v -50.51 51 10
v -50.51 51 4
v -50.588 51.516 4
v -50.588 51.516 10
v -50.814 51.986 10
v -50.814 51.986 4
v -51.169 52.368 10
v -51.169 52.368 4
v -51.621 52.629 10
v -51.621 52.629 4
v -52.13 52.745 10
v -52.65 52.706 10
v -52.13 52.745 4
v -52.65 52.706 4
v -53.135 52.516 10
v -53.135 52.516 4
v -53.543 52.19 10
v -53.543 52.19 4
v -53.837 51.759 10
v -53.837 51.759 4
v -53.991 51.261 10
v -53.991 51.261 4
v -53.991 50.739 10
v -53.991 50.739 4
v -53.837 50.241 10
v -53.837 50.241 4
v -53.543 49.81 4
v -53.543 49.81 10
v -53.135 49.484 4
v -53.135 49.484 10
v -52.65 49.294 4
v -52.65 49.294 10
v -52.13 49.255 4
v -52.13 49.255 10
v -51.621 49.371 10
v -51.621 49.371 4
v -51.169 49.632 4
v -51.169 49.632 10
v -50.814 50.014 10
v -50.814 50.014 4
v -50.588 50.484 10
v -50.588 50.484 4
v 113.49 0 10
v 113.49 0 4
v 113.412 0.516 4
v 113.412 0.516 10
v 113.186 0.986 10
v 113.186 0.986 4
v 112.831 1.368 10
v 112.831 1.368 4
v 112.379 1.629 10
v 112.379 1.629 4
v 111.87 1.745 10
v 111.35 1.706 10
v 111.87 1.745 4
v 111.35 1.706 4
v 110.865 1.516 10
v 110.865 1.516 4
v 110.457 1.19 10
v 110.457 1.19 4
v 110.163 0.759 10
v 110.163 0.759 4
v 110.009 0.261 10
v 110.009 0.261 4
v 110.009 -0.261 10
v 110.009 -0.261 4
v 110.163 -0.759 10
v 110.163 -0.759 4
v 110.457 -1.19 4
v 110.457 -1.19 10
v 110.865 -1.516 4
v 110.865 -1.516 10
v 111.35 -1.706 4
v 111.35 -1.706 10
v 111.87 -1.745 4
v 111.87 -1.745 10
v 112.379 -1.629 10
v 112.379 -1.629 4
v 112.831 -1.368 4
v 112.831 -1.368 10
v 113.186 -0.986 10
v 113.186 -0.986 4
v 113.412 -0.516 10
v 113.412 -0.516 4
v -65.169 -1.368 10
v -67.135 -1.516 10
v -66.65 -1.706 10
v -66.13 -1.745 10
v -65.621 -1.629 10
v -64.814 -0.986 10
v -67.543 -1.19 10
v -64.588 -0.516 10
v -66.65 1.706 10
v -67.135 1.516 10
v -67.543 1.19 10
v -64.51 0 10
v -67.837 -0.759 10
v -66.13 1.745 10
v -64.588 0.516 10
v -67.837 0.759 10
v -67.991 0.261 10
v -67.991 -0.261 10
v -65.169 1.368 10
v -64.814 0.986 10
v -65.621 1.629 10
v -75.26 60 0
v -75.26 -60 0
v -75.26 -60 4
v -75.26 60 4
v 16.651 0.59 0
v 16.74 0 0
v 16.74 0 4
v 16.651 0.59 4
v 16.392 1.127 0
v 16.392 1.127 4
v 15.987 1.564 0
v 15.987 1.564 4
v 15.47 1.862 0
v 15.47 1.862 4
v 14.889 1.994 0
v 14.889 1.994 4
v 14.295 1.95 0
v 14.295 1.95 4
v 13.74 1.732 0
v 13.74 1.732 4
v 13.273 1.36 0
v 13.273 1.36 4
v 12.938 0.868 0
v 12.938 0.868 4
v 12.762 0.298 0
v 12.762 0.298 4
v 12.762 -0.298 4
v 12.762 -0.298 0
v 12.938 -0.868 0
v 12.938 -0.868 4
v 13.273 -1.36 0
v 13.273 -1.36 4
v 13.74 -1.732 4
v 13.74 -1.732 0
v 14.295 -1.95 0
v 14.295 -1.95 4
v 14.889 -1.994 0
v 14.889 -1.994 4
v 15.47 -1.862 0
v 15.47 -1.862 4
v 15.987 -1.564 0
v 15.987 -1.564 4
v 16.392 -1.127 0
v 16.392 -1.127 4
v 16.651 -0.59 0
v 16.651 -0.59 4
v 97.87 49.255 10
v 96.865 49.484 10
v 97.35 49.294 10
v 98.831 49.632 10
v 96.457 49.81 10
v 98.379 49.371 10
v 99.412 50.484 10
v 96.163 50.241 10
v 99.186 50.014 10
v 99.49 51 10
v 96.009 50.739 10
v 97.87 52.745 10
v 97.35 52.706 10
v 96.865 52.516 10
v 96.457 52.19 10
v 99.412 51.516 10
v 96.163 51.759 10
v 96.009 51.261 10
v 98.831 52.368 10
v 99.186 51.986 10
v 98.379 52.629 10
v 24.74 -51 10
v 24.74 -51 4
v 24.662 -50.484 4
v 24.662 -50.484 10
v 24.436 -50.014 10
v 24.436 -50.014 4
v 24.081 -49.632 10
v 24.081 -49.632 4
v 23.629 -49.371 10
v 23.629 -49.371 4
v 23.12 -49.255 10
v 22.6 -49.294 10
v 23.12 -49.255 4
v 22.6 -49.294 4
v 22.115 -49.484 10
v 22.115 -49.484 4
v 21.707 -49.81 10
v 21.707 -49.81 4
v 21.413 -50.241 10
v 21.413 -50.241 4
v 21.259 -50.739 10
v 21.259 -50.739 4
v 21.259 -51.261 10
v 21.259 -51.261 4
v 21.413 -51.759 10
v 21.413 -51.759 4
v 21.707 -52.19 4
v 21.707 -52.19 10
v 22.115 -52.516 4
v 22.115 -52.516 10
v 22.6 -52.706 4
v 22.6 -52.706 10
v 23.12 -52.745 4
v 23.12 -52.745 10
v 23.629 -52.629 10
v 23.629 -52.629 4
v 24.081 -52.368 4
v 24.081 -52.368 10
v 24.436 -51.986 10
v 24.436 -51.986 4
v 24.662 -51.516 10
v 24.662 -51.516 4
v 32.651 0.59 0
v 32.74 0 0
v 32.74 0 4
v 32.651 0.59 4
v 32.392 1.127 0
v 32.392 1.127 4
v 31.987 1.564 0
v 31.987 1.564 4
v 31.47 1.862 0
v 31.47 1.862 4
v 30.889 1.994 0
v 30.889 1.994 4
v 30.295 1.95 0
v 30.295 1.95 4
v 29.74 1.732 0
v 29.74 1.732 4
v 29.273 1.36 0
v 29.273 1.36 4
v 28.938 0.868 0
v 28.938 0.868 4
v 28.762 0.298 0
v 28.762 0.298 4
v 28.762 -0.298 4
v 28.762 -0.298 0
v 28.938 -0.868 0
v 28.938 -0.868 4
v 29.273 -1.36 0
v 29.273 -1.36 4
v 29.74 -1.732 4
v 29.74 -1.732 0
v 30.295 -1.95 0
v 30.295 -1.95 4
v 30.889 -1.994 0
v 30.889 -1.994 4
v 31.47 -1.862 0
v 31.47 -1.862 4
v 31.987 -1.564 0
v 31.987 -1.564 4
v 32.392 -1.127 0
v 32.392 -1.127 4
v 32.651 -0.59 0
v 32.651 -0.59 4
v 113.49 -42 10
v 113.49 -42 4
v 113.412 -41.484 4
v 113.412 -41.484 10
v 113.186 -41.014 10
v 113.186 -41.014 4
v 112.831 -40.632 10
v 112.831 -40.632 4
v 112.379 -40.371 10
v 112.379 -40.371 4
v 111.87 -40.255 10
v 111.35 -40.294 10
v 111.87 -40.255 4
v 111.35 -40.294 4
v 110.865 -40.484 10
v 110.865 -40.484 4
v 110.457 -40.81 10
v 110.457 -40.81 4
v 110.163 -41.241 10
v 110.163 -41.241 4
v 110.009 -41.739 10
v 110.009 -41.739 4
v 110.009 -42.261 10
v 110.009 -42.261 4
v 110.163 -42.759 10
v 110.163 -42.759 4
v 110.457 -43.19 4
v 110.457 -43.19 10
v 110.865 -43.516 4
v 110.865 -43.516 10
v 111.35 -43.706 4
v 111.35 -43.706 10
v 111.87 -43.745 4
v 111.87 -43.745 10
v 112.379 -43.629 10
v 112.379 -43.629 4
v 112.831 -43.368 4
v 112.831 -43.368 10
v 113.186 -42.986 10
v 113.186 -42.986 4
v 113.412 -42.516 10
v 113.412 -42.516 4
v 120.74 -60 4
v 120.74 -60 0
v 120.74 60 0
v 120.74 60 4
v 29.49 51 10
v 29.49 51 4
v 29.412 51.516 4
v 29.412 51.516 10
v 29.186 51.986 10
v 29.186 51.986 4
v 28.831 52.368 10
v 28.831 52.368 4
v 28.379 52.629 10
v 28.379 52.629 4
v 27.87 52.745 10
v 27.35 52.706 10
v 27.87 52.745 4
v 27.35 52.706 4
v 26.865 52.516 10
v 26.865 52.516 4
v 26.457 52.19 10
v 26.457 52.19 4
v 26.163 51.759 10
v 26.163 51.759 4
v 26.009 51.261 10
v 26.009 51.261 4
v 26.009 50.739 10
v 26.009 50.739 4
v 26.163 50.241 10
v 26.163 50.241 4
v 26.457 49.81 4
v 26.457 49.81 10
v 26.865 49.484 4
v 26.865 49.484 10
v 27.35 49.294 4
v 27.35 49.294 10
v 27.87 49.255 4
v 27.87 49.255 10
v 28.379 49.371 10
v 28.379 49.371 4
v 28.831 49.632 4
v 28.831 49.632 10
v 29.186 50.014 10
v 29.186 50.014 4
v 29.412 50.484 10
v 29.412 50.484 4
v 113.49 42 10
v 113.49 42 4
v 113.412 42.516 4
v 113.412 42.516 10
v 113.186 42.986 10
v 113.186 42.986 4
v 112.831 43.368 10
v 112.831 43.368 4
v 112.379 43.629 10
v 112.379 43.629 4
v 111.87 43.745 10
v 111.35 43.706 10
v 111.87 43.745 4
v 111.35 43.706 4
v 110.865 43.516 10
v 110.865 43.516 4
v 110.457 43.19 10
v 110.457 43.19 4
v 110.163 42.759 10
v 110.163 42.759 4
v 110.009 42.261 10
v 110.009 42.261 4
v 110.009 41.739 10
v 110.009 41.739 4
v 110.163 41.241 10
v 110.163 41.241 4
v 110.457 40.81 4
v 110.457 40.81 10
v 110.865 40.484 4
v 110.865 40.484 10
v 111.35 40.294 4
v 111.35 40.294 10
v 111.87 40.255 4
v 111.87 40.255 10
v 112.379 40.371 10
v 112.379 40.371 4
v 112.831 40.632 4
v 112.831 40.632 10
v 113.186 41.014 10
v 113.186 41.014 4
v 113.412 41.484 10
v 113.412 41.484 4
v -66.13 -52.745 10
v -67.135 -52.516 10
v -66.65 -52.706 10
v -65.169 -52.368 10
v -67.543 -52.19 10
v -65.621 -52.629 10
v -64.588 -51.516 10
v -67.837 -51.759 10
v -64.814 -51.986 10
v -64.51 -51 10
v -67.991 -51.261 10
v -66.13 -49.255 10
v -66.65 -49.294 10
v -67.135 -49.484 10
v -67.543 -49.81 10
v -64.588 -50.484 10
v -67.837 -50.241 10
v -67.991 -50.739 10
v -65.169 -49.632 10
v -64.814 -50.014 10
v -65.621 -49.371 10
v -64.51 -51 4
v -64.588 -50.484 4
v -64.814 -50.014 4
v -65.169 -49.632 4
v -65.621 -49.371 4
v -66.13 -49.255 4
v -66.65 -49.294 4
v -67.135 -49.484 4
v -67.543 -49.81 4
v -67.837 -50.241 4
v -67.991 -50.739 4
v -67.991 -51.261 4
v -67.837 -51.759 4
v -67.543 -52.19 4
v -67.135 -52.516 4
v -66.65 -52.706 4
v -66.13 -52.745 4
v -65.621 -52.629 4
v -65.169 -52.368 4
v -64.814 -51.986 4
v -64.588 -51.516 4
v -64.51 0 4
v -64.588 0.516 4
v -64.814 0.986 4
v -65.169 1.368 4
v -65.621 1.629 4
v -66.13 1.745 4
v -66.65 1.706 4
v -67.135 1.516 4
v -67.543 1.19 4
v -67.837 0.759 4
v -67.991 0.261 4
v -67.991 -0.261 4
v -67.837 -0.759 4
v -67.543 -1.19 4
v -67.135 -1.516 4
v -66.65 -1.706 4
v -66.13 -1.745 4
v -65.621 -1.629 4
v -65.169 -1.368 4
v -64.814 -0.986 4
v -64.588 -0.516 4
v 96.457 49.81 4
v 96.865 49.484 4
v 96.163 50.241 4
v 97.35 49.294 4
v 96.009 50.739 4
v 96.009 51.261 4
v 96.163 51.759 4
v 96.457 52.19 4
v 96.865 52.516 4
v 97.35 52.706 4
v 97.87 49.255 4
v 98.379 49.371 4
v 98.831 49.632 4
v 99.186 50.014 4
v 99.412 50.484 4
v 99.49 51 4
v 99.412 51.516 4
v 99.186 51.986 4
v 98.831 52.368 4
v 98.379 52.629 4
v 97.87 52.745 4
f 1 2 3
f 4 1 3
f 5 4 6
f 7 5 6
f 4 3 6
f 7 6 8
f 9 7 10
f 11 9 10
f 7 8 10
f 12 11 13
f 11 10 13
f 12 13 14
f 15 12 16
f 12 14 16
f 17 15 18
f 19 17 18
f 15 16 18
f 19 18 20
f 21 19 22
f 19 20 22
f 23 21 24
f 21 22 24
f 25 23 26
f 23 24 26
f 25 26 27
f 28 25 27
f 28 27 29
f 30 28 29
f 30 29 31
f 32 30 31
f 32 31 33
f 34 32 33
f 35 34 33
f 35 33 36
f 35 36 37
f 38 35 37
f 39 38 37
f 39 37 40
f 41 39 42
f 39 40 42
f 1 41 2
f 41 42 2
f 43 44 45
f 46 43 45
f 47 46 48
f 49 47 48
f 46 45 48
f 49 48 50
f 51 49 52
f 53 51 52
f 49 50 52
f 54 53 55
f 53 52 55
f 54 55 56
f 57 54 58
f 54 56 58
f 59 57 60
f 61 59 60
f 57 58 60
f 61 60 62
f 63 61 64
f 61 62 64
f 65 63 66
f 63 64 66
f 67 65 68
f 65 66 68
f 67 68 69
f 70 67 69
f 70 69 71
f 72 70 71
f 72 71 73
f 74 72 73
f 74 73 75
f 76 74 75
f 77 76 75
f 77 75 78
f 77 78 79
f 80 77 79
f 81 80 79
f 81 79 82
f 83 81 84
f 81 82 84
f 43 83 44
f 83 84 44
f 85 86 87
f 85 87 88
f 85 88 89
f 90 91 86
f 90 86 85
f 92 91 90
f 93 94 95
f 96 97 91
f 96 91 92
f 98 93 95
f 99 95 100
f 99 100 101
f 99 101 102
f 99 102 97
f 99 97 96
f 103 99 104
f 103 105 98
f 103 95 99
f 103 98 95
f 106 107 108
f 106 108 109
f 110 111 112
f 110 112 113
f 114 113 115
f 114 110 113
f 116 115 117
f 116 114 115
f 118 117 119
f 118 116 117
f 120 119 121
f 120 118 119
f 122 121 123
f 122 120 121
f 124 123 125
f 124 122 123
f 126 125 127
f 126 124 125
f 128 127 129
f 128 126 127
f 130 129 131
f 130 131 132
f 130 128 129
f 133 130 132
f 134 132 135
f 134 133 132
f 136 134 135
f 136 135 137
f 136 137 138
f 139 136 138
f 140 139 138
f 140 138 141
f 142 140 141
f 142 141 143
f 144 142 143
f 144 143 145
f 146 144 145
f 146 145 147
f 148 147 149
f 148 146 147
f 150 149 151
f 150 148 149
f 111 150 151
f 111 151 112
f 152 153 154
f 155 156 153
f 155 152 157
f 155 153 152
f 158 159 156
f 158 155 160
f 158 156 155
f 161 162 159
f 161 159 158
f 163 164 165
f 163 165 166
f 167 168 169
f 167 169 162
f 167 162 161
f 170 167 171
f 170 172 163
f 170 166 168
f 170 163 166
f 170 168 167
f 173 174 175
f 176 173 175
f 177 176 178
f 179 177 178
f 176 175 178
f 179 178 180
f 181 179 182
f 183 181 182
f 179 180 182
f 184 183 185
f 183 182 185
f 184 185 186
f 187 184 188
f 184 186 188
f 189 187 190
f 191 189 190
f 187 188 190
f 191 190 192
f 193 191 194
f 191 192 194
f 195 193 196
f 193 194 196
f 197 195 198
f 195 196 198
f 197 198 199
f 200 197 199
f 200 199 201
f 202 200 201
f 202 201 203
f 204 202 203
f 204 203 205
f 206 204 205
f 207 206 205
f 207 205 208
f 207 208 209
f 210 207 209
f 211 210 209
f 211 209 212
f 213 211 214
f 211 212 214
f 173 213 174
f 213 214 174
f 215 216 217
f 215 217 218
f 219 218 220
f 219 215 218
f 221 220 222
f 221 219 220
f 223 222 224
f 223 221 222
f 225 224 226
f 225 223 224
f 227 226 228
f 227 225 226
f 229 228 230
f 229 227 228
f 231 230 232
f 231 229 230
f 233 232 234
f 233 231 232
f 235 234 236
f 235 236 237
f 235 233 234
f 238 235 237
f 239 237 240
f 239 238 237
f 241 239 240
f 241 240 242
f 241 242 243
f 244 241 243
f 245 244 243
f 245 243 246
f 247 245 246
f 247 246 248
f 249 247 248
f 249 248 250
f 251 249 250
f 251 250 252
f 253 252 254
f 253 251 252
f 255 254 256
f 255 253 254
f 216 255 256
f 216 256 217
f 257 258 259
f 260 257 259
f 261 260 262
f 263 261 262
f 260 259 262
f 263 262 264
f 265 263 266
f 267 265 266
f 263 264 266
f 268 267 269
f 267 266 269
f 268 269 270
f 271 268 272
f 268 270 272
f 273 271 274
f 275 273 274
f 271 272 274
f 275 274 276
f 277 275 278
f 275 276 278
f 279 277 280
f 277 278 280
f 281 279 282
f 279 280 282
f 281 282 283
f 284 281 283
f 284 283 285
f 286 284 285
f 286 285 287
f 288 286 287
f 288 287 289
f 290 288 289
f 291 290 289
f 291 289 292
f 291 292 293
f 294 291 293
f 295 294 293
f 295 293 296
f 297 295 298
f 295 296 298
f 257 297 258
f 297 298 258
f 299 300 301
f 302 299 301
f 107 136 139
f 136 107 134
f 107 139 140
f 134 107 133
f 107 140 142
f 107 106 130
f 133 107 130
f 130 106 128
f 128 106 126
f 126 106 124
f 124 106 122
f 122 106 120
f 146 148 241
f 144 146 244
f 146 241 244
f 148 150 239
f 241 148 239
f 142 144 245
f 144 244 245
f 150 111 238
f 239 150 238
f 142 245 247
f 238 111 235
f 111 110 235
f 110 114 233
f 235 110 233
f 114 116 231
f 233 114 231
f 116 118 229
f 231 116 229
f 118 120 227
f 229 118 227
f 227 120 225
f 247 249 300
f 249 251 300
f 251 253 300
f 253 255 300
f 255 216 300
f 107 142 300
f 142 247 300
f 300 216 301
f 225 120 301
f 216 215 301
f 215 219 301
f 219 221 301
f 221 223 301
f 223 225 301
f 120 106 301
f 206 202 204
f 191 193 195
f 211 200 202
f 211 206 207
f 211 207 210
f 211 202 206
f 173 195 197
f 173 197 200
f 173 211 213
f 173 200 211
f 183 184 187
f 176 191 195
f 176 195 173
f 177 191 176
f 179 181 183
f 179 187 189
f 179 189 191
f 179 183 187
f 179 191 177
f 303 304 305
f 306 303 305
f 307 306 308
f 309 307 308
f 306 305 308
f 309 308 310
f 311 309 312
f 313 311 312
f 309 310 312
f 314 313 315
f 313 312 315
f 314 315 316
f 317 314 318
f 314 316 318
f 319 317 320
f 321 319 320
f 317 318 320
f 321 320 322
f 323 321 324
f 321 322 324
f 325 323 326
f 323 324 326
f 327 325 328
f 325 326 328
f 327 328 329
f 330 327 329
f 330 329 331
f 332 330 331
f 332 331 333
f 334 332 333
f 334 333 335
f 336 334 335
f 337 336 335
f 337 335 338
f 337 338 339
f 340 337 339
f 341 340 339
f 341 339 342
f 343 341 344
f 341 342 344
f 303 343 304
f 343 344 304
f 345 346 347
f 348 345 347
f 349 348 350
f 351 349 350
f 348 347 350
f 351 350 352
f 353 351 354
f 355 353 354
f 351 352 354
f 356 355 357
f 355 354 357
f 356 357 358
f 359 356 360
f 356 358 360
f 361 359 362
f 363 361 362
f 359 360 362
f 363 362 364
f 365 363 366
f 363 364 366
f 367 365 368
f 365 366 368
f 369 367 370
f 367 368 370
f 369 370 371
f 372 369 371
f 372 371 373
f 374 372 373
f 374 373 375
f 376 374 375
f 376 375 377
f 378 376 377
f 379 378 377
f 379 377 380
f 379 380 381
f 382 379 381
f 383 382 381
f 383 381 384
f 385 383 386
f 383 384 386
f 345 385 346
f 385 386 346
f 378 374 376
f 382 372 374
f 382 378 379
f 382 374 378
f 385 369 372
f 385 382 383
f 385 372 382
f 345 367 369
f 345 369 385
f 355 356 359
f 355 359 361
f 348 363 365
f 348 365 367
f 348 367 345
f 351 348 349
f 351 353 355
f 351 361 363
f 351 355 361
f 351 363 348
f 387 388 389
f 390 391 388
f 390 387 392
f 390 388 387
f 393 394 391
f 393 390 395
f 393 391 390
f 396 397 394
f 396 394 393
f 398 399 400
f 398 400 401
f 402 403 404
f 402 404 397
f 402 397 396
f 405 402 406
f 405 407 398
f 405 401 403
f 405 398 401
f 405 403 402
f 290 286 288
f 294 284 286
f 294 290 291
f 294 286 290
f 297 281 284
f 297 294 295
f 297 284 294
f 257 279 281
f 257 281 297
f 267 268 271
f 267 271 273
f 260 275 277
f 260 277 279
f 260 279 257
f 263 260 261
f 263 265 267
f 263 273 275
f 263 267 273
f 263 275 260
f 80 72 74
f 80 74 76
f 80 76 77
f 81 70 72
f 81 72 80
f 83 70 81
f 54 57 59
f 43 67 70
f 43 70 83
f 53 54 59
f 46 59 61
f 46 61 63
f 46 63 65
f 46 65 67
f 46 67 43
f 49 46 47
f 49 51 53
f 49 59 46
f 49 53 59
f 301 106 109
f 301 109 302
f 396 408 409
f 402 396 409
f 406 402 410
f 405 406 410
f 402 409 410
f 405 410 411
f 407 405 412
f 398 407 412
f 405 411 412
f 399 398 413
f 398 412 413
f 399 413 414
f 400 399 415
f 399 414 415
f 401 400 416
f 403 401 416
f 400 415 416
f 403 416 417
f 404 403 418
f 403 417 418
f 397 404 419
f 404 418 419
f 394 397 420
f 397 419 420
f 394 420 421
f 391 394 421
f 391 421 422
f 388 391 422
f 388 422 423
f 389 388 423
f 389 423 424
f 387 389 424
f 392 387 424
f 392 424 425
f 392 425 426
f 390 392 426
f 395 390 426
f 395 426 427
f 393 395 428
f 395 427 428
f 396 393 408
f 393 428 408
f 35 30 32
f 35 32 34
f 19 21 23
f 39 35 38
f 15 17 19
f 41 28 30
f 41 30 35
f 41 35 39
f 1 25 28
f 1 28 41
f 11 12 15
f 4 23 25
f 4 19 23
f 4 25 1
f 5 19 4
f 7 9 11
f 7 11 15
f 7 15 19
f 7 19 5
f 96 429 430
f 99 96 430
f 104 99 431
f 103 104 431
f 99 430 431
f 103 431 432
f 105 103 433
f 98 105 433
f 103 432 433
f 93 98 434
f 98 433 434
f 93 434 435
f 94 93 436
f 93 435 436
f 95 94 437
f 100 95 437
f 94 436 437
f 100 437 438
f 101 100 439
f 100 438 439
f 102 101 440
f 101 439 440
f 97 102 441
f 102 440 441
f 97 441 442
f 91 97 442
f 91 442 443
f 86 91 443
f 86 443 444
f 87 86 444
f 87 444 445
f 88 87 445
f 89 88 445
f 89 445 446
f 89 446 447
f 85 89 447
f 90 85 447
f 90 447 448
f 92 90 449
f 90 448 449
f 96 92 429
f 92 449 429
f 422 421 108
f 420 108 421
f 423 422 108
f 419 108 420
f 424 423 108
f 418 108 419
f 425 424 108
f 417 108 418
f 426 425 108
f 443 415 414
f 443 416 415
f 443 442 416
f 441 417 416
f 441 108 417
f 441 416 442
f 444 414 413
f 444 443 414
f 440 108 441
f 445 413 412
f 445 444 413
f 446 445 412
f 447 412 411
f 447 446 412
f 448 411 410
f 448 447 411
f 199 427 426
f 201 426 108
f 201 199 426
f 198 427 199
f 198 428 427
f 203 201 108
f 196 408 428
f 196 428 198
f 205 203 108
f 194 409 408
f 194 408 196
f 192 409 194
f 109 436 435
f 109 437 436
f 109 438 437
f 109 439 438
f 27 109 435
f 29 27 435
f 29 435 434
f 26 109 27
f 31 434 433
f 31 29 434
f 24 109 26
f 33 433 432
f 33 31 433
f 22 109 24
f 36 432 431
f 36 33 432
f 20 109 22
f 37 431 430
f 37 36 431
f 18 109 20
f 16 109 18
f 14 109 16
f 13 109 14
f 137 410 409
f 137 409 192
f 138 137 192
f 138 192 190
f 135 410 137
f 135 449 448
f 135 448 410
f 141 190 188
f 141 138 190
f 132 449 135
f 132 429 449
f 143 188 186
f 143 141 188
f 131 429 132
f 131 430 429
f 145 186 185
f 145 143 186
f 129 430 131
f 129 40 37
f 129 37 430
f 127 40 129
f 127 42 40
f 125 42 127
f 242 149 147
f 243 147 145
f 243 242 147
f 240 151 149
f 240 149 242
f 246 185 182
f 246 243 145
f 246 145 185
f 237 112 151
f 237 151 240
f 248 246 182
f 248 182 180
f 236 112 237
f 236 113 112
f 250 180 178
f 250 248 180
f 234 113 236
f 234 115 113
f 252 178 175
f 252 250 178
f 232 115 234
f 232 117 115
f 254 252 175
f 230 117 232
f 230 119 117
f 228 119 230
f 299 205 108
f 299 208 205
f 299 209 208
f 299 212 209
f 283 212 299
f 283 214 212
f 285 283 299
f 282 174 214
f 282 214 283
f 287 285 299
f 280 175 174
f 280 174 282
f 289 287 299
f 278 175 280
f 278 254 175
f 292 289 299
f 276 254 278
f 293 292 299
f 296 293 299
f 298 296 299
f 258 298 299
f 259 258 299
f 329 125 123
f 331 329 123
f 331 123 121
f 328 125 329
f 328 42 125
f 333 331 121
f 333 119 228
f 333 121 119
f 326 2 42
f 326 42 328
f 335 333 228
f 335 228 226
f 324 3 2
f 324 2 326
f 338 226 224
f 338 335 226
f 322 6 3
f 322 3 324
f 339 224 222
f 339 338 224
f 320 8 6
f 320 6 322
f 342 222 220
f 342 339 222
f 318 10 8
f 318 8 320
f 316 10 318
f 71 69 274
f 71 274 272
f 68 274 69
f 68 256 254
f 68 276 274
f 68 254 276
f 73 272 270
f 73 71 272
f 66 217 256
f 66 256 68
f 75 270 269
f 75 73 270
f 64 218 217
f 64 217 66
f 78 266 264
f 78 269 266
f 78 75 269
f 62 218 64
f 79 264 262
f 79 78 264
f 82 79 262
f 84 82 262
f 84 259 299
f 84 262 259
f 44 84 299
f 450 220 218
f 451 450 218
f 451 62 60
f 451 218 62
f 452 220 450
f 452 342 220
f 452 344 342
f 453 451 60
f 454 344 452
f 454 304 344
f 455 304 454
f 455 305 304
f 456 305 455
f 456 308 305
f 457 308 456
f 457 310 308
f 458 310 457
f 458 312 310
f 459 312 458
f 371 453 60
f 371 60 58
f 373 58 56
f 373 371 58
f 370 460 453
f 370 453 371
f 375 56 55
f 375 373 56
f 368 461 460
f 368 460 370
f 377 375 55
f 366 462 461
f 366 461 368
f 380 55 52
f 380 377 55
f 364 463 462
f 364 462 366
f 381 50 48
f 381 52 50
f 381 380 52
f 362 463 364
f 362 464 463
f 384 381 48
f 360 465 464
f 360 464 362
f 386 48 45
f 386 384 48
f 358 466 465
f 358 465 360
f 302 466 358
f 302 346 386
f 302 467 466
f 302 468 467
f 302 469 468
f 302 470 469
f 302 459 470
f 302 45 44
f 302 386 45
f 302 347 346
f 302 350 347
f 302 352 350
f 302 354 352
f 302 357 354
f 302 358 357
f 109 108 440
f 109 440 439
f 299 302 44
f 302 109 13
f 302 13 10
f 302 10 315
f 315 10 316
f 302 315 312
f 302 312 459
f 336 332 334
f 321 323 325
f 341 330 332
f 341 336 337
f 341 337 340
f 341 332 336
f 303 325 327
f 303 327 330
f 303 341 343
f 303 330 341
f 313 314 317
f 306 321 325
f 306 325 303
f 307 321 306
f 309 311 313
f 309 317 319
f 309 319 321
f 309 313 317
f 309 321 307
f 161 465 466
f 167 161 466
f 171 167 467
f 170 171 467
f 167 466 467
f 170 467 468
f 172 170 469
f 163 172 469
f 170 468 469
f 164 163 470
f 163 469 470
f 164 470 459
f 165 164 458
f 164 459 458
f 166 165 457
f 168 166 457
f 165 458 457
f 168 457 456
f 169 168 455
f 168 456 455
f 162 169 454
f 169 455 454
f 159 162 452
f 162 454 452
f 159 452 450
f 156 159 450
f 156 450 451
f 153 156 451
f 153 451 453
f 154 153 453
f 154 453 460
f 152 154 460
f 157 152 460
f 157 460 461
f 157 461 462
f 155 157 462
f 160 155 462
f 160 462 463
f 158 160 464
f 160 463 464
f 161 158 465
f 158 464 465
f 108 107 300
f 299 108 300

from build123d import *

# Parameters (mm, degrees)
F0_W     = 196
F0_H     = 120
F0_R     = 2
F1_DEPTH = 4
F2_R     = 1.75
F3_DEPTH = 6


with BuildPart() as f1:
    # F0 (on Top) → F1 (new body)
    with BuildSketch(Plane.XY):
        with Locations((22.739595, 0)):
            Rectangle(F0_W, F0_H)
        with Locations((14.739595, 0)):
            Circle(F0_R, mode=Mode.SUBTRACT)
        with Locations((30.739595, 0)):
            Circle(F0_R, mode=Mode.SUBTRACT)
    extrude(amount=F1_DEPTH)

    # F2 (on face) → F3 (join)
    with BuildSketch(Plane.XY.offset(4)):
        with Locations((-66.260405, -51)):
            Circle(F2_R)
        with Locations((22.989595, -51)):
            Circle(F2_R)
        with Locations((111.739595, -42)):
            Circle(F2_R)
        with Locations((111.739595, 42)):
            Circle(F2_R)
        with Locations((-52.260405, 51)):
            Circle(F2_R)
        with Locations((-66.260405, 0)):
            Circle(F2_R)
        with Locations((97.739595, 51)):
            Circle(F2_R)
        with Locations((27.739595, 51)):
            Circle(F2_R)
        with Locations((111.739595, 0)):
            Circle(F2_R)
    extrude(amount=F3_DEPTH)


solid = f1.part
